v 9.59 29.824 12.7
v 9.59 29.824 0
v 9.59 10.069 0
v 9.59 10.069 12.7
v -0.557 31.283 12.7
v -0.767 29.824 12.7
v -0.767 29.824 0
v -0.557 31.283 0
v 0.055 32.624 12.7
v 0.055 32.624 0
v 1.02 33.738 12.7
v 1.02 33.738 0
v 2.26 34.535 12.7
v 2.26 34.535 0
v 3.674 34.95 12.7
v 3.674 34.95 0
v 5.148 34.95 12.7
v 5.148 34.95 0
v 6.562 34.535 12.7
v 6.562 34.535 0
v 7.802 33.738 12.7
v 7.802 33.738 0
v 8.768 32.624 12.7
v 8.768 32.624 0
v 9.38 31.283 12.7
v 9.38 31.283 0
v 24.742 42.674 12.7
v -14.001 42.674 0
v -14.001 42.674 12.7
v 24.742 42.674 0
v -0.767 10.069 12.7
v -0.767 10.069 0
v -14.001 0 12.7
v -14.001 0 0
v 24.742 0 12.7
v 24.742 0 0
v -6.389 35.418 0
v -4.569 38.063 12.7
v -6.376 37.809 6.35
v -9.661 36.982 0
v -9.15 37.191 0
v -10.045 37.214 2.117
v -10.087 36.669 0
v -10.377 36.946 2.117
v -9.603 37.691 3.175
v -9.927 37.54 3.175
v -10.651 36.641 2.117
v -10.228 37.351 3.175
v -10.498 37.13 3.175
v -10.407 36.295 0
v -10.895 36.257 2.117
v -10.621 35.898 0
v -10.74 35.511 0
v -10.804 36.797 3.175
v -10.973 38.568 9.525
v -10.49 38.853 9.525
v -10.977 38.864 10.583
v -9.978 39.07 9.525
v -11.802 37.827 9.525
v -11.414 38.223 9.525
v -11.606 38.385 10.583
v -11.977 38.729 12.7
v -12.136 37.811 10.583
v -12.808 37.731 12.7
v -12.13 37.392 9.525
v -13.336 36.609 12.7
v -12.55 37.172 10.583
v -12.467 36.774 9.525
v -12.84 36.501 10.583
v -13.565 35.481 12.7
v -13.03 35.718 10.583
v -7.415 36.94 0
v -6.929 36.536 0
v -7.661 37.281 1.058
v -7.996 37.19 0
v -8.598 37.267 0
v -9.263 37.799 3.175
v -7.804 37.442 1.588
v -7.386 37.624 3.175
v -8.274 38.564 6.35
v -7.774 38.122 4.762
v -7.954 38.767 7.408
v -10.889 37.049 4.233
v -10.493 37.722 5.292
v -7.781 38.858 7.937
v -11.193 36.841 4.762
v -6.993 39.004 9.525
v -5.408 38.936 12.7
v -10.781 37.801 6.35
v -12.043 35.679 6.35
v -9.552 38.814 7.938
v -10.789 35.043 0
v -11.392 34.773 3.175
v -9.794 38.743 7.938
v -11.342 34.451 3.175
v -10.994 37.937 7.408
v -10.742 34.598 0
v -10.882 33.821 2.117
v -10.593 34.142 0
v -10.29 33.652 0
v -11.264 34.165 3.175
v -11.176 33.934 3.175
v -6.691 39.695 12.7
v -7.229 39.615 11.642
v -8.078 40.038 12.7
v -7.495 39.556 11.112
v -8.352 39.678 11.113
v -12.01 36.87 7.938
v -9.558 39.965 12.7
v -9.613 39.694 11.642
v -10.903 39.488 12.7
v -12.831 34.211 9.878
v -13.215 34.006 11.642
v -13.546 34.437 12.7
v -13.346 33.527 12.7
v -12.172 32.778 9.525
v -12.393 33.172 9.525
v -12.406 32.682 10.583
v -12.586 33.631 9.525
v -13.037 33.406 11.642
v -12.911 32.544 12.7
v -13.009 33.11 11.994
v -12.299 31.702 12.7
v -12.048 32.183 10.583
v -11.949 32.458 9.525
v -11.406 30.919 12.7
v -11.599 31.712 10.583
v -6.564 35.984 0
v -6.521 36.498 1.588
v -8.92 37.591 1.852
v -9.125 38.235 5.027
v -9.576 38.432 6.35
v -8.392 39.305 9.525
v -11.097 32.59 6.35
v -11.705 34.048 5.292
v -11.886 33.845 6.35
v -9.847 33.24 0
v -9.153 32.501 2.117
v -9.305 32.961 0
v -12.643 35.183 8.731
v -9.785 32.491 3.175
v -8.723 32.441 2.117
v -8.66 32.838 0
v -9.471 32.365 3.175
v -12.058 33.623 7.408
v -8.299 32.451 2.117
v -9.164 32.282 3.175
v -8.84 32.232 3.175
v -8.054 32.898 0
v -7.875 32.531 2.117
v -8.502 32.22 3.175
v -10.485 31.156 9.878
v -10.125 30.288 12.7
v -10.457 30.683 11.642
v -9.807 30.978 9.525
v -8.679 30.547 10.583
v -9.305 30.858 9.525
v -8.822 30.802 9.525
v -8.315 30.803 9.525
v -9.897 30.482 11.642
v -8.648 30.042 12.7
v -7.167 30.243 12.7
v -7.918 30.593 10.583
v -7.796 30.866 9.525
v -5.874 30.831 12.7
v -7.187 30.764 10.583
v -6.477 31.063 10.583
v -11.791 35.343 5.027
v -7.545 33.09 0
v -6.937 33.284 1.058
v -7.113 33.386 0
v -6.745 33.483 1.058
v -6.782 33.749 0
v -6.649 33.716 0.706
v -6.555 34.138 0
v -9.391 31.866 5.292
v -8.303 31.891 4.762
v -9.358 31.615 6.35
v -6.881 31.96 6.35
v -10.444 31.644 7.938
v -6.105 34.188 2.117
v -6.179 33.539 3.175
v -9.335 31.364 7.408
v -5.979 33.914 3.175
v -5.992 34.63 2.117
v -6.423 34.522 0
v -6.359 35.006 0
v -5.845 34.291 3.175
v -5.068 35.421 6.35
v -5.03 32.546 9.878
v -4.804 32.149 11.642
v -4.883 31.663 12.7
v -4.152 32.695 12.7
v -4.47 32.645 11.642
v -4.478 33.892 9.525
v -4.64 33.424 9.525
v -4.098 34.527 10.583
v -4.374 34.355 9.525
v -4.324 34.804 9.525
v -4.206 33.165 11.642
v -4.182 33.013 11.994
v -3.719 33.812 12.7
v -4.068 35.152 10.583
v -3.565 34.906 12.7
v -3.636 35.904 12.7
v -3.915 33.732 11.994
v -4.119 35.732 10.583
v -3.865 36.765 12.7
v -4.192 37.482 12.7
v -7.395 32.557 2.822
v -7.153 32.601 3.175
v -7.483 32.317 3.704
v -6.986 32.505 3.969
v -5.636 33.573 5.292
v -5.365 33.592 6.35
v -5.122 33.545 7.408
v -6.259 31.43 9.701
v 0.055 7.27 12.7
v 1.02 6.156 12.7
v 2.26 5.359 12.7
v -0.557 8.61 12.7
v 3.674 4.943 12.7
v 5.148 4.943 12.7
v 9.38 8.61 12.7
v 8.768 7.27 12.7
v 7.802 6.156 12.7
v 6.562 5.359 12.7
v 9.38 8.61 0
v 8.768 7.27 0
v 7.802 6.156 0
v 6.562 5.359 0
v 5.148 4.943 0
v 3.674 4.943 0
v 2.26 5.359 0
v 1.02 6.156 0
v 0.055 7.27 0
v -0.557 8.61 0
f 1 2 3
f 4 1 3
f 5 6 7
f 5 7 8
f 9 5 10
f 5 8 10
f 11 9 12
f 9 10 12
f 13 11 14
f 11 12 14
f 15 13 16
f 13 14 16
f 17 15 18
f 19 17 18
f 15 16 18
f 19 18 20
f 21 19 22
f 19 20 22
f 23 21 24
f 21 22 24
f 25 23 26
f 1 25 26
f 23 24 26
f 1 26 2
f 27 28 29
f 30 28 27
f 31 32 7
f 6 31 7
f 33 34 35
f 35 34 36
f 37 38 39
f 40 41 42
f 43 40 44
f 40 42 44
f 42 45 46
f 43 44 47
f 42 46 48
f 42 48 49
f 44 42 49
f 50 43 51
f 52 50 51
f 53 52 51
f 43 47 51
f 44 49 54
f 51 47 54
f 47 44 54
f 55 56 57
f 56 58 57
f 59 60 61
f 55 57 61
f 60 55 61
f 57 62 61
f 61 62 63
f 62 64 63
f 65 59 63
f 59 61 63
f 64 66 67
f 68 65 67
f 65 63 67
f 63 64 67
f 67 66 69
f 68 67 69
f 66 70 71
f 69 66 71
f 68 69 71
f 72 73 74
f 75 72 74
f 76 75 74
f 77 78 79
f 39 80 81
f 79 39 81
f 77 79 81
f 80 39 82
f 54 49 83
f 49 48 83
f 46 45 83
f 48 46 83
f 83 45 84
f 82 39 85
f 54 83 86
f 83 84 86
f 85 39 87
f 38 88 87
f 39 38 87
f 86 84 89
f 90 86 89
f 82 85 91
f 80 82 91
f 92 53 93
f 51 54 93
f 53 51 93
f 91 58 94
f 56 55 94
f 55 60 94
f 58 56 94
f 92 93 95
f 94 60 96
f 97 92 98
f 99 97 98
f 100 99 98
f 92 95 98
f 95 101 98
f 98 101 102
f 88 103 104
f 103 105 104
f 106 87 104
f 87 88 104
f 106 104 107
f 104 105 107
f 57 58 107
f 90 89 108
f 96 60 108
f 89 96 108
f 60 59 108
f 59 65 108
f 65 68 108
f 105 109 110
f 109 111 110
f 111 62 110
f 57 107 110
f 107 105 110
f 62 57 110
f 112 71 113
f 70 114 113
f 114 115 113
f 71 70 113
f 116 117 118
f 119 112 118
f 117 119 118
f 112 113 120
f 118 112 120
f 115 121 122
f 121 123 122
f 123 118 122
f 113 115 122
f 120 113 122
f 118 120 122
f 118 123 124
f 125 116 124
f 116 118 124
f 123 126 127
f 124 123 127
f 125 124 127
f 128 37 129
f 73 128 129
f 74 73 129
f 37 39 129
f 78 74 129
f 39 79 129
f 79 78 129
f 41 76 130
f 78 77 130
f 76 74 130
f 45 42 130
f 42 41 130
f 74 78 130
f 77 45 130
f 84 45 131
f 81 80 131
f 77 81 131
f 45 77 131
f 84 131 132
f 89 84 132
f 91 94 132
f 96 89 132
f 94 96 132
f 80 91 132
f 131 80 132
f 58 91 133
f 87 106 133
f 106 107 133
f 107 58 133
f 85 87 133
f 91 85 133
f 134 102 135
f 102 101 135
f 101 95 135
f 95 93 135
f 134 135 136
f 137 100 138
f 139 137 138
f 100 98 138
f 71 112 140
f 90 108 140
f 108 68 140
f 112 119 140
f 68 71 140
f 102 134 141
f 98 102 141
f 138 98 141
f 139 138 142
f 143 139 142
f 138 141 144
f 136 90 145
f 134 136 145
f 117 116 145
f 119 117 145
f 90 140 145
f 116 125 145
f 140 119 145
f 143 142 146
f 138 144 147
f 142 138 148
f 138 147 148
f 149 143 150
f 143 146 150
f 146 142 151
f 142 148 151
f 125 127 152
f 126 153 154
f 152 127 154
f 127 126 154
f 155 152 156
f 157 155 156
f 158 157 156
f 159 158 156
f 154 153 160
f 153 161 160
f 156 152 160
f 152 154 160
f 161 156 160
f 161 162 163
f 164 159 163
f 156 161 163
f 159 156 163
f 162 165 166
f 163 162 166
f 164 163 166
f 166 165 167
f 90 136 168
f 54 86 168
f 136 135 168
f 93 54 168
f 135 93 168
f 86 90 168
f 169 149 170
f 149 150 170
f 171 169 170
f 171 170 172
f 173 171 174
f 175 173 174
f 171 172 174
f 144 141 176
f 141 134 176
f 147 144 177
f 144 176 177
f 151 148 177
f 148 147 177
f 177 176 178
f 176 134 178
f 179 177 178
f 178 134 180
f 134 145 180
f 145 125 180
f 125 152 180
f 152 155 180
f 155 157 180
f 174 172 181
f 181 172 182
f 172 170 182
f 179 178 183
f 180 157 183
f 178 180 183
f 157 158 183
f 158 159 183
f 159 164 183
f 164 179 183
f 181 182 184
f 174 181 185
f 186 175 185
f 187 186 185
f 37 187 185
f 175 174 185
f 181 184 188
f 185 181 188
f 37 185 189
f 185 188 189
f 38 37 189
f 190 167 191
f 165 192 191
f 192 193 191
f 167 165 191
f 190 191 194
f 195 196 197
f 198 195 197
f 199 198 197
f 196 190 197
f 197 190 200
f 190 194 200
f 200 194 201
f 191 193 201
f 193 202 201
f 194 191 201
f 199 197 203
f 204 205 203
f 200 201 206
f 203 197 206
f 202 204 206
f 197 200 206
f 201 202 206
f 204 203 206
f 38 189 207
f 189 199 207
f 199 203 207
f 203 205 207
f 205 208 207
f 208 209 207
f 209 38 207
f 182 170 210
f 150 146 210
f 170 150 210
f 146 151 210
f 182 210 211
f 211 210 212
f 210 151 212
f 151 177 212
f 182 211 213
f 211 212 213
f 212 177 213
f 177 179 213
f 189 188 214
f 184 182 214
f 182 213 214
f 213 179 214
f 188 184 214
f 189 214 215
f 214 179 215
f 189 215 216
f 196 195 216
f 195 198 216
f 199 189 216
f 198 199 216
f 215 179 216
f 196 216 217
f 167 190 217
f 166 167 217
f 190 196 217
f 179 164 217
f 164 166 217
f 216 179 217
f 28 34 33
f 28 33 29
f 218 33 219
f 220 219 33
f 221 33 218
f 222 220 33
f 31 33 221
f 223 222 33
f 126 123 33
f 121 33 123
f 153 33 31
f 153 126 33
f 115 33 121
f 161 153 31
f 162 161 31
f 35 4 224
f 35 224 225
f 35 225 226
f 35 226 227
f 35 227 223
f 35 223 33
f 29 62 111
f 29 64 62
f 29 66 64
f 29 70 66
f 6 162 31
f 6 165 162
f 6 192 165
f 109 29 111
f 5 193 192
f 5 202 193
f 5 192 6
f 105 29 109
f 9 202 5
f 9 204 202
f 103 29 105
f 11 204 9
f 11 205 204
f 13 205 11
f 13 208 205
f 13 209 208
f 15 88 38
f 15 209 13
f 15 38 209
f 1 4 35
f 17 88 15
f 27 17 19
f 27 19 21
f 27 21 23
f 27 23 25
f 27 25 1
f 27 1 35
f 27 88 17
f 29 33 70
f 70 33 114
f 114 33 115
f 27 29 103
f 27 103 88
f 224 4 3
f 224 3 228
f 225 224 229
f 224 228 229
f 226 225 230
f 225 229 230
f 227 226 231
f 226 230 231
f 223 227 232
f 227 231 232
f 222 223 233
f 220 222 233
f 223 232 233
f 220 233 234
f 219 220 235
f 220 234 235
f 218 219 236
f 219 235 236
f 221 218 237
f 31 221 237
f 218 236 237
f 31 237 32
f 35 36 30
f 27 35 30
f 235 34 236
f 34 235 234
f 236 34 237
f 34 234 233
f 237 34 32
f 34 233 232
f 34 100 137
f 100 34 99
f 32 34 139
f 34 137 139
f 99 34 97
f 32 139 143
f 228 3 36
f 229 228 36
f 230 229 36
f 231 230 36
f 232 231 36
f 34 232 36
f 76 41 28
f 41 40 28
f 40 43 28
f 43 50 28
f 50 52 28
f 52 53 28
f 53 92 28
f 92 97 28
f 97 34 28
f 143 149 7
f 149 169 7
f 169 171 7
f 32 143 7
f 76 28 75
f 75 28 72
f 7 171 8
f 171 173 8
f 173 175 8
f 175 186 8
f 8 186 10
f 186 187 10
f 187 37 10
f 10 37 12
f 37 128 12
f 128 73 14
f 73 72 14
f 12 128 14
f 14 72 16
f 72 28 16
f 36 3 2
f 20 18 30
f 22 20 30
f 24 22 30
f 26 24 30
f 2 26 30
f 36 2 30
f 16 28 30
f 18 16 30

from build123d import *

# Parameters (mm, degrees)
SKETCH1_W           = 38.742575614
SKETCH1_H           = 42.674371655
BOSS_EXTRUDE1_DEPTH = 12.7


with BuildPart() as part:
    # Sketch1 → Boss-Extrude1 (new body)
    with BuildSketch(Plane.XY):
        with Locations((5.370258006, 21.337185828)):
            Rectangle(SKETCH1_W, SKETCH1_H)
        with BuildLine():
            Line((9.589746439, 29.824111426), (9.589746439, 10.069233761))
            ThreePointArc((9.589746439, 10.069233761), (4.411283362, 4.890770684), (-0.767179715, 10.069233761))
            Line((-0.767179715, 10.069233761), (-0.767179715, 29.824111426))
            ThreePointArc((-0.767179715, 29.824111426), (4.411283362, 35.002574503), (9.589746439, 29.824111426))
        make_face(mode=Mode.SUBTRACT)
    extrude(amount=BOSS_EXTRUDE1_DEPTH)

    # Cut-Loft1: read off the stored shape, not the designer's step
    # Cut-Loft1: loft between two sections, ruled curve by curve
    cut_loft1_from = [
        Edge.make_bspline([(-6.388735864, 35.417554769, 0), (-7.120249807, 39.787035762, 0), (-11.489730799, 39.055521819, 0), (-10.758216856, 34.686040826, 0), (-10.026702913, 30.316559834, 0), (-5.657221921, 31.048073777, 0), (-6.388735864, 35.417554769, 0)], [0, 0, 0, 0, 0.5, 0.5, 0.5, 1, 1, 1, 1], 3, [1, 0.333333333, 0.333333333, 1, 0.333333333, 0.333333333, 1]),
    ]
    cut_loft1_to = [
        Edge.make_bspline([(-4.568610902, 38.062672565, 12.7), (-10.590360438, 46.072403481, 12.7), (-18.600091353, 40.050653945, 12.7), (-12.578341818, 32.04092303, 12.7), (-6.556592282, 24.031192114, 12.7), (1.453138633, 30.05294165, 12.7), (-4.568610902, 38.062672565, 12.7)], [0, 0, 0, 0, 0.5, 0.5, 0.5, 1, 1, 1, 1], 3, [1, 0.333333333, 0.333333333, 1, 0.333333333, 0.333333333, 1]),
    ]
    cut_loft1 = Solid(Shell([*[Face.make_surface_from_curves(cut_loft1_from[k], cut_loft1_to[k]) for k in range(1)], Face(Wire(cut_loft1_from)), Face(Wire(cut_loft1_to))]))
    add(cut_loft1, mode=Mode.SUBTRACT)


solid = part.part
